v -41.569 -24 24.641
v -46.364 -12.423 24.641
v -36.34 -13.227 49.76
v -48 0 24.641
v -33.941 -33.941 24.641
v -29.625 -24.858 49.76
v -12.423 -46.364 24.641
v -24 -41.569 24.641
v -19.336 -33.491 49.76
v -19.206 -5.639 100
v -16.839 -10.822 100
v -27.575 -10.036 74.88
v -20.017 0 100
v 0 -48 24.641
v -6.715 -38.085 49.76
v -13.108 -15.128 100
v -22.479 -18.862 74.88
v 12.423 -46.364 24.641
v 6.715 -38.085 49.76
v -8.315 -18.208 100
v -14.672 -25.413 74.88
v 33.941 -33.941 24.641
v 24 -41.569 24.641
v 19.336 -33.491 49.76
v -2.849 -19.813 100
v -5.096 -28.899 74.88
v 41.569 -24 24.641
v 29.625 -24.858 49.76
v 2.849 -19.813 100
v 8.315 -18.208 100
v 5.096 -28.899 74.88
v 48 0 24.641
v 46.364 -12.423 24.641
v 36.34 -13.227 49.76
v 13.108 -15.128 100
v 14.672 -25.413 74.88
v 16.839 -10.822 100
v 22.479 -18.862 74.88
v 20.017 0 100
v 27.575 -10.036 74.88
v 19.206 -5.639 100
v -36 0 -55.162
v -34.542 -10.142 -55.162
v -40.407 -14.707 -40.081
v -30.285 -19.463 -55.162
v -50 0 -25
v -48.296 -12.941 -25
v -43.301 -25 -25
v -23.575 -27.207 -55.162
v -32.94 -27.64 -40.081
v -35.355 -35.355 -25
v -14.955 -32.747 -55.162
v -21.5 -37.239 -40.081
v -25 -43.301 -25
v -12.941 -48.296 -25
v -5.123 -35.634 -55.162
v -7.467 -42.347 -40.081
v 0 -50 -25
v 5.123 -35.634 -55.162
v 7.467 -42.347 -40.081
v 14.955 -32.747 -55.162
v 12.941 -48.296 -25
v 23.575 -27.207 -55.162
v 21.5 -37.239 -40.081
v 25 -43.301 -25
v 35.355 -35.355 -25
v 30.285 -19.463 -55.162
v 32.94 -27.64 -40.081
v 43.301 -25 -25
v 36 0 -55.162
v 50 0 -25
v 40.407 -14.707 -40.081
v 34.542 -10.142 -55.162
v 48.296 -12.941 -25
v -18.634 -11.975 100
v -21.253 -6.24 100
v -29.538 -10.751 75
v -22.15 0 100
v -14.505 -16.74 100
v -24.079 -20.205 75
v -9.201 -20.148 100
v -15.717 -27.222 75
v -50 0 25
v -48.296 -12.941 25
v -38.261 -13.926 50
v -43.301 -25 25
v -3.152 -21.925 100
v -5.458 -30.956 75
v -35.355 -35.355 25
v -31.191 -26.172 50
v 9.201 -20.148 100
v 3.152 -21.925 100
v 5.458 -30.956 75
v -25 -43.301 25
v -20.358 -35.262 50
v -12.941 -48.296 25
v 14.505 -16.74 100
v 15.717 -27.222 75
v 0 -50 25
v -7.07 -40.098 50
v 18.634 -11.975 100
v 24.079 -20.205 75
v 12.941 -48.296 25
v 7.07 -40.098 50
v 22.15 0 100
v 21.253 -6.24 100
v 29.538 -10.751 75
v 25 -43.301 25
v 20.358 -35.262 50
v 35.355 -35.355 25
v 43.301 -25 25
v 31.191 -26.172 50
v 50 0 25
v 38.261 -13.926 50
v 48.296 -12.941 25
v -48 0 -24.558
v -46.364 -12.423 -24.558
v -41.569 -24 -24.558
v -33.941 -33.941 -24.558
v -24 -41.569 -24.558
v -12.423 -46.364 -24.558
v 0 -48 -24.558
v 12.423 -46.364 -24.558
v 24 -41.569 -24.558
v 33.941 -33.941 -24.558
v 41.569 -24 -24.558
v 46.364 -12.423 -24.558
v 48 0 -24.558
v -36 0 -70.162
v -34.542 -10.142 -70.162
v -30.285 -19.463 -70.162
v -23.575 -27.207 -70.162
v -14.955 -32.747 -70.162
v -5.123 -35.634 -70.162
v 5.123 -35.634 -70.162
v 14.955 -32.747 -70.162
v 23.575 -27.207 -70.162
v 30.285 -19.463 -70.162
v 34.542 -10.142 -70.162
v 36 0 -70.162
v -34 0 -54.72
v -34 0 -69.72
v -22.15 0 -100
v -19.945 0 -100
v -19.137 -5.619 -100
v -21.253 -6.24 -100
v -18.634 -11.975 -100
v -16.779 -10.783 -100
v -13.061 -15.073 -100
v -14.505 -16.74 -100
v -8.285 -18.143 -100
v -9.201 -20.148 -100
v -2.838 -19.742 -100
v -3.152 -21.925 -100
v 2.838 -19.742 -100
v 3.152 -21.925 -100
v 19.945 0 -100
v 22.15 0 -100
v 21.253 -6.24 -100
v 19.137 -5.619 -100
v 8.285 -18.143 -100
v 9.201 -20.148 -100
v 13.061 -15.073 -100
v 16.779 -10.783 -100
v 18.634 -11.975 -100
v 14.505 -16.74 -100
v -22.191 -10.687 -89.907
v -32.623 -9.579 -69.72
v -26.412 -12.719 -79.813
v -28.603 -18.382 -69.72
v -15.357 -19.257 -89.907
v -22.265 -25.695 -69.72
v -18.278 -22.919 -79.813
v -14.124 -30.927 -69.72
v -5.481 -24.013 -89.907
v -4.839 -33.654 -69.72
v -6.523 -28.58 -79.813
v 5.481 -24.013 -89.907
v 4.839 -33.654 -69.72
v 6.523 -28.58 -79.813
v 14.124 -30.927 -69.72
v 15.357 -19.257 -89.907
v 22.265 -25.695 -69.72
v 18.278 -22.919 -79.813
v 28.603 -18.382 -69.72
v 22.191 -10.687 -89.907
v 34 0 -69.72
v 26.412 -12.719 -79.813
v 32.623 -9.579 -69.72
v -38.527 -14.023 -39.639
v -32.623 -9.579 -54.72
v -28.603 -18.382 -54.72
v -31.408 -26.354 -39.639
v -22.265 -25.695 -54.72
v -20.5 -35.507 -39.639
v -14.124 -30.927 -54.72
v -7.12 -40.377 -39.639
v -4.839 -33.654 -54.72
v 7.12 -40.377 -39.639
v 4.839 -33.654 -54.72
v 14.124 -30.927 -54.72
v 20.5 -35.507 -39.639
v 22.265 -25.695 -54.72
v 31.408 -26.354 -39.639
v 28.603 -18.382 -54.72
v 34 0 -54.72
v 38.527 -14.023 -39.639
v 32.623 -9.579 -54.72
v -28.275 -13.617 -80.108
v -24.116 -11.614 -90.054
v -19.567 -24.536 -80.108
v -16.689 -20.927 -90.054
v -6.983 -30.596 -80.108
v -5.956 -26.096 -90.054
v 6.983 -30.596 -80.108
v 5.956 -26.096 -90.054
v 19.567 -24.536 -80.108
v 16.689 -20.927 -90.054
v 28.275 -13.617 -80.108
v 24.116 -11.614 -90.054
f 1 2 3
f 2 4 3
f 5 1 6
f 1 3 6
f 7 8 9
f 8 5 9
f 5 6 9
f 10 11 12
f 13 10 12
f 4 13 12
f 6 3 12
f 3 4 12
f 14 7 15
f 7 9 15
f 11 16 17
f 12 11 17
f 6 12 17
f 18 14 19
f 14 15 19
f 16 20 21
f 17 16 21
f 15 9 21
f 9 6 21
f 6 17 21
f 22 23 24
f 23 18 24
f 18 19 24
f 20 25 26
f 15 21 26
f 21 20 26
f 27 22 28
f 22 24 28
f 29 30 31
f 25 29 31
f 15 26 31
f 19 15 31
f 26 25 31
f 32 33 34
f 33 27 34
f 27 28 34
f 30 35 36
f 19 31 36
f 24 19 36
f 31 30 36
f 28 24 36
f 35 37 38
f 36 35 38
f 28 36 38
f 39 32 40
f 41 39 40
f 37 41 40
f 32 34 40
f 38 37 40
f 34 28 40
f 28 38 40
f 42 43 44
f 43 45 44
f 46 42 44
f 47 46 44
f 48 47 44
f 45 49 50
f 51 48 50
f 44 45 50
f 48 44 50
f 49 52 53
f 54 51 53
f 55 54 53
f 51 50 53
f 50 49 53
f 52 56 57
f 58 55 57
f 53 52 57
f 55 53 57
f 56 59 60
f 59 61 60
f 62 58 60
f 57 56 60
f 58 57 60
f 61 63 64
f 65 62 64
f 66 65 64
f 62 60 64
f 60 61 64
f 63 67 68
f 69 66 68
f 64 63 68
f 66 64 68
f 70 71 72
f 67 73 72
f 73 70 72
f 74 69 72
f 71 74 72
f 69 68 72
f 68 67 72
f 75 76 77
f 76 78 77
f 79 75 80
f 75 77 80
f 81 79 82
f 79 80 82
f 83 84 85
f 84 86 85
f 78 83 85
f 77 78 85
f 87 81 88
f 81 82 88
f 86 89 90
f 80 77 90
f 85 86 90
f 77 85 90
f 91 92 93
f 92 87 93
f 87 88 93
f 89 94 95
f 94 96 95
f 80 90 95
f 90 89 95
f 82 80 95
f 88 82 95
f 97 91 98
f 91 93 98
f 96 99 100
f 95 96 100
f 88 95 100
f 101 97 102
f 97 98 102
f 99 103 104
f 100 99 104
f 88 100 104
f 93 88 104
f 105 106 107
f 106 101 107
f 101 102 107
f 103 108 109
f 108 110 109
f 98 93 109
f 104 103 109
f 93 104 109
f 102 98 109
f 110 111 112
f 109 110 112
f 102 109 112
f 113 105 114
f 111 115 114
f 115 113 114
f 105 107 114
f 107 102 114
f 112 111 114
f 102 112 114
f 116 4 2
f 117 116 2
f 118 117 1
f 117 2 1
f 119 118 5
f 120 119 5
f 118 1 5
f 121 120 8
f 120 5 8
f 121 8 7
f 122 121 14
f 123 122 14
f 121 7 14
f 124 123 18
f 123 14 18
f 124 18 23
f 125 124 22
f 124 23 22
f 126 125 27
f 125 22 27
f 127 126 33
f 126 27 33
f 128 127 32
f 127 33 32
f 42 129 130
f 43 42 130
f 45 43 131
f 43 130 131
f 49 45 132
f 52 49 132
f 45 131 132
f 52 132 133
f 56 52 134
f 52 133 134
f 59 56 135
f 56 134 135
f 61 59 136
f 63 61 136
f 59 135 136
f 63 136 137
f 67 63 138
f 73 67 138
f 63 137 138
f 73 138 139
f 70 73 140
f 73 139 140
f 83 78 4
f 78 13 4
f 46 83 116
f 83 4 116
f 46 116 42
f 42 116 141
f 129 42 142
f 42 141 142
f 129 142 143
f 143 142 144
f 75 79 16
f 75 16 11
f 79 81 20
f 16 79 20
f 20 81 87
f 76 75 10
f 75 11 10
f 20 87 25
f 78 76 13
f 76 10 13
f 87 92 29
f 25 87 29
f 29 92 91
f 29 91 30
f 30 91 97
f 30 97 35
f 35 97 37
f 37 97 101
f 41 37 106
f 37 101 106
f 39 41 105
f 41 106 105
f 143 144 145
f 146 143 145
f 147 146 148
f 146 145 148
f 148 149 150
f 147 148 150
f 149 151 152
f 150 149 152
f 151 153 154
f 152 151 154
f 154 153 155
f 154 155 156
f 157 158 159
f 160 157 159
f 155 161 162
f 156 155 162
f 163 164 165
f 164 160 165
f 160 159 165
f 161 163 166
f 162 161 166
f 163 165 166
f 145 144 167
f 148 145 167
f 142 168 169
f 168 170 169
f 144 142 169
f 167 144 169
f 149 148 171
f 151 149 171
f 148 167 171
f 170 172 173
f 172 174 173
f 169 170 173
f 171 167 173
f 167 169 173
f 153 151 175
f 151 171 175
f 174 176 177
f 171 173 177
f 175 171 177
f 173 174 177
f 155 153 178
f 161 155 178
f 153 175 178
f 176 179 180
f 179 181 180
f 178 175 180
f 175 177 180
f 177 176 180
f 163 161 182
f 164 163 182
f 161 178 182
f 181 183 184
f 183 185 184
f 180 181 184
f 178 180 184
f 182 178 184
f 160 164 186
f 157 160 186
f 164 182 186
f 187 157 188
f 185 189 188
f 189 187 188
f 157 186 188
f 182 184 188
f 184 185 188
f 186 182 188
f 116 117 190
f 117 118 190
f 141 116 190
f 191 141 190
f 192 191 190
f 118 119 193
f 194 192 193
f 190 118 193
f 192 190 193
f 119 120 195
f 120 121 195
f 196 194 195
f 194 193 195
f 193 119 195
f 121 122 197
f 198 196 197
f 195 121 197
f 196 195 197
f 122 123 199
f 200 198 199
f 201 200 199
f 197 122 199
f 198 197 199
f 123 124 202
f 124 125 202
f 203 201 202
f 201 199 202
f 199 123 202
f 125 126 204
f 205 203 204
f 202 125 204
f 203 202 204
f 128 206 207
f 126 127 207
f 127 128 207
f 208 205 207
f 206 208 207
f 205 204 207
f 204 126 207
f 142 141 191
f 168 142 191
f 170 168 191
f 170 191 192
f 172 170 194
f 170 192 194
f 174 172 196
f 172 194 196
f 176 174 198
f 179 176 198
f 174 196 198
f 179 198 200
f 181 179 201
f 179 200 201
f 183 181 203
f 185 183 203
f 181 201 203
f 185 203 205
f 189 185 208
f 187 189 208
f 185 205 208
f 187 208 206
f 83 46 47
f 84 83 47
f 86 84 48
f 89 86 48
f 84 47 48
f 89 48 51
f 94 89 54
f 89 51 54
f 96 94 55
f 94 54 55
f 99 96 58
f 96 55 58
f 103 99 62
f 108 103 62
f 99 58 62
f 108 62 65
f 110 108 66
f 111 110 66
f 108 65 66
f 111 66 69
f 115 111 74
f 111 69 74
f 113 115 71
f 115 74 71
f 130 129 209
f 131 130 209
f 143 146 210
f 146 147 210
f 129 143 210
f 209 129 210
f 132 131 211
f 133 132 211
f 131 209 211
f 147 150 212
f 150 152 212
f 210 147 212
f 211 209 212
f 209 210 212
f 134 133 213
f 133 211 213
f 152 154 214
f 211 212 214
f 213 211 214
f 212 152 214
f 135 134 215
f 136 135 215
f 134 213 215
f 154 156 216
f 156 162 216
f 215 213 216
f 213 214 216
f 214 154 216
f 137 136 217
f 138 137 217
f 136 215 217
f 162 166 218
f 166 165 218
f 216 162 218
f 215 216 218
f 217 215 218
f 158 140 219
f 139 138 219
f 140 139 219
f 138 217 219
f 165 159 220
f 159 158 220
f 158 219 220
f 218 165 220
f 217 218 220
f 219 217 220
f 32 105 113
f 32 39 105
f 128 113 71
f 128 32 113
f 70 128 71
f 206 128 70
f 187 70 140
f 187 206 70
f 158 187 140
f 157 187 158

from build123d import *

# Parameters (mm, degrees)
REVOLVE1_ANGLE = 180


with BuildPart() as part:
    # Sketch3 → Revolve1 (revolve, symmetric)
    with BuildSketch(Plane(origin=(0, 0, 0), x_dir=(0, 0, -1), z_dir=(1, 0, 0))) as revolve1_sk:
        Polygon((-100, -22.15), (-25, -50), (25, -50), (55.161579892, -36), (70.161579892, -36), (100, -22.15), (100, -19.945050391), (69.720036749, -34), (54.720036749, -34), (24.558456857, -48), (-24.640654181, -48), (-100, -20.016562919), align=None)
    revolve(axis=Axis((0, 0, 100), (0, 0, -1)), revolution_arc=REVOLVE1_ANGLE / 2)
    revolve(revolve1_sk.sketch, axis=Axis((0, 0, 100), (0, 0, 1)), revolution_arc=REVOLVE1_ANGLE / 2)


solid = part.part
